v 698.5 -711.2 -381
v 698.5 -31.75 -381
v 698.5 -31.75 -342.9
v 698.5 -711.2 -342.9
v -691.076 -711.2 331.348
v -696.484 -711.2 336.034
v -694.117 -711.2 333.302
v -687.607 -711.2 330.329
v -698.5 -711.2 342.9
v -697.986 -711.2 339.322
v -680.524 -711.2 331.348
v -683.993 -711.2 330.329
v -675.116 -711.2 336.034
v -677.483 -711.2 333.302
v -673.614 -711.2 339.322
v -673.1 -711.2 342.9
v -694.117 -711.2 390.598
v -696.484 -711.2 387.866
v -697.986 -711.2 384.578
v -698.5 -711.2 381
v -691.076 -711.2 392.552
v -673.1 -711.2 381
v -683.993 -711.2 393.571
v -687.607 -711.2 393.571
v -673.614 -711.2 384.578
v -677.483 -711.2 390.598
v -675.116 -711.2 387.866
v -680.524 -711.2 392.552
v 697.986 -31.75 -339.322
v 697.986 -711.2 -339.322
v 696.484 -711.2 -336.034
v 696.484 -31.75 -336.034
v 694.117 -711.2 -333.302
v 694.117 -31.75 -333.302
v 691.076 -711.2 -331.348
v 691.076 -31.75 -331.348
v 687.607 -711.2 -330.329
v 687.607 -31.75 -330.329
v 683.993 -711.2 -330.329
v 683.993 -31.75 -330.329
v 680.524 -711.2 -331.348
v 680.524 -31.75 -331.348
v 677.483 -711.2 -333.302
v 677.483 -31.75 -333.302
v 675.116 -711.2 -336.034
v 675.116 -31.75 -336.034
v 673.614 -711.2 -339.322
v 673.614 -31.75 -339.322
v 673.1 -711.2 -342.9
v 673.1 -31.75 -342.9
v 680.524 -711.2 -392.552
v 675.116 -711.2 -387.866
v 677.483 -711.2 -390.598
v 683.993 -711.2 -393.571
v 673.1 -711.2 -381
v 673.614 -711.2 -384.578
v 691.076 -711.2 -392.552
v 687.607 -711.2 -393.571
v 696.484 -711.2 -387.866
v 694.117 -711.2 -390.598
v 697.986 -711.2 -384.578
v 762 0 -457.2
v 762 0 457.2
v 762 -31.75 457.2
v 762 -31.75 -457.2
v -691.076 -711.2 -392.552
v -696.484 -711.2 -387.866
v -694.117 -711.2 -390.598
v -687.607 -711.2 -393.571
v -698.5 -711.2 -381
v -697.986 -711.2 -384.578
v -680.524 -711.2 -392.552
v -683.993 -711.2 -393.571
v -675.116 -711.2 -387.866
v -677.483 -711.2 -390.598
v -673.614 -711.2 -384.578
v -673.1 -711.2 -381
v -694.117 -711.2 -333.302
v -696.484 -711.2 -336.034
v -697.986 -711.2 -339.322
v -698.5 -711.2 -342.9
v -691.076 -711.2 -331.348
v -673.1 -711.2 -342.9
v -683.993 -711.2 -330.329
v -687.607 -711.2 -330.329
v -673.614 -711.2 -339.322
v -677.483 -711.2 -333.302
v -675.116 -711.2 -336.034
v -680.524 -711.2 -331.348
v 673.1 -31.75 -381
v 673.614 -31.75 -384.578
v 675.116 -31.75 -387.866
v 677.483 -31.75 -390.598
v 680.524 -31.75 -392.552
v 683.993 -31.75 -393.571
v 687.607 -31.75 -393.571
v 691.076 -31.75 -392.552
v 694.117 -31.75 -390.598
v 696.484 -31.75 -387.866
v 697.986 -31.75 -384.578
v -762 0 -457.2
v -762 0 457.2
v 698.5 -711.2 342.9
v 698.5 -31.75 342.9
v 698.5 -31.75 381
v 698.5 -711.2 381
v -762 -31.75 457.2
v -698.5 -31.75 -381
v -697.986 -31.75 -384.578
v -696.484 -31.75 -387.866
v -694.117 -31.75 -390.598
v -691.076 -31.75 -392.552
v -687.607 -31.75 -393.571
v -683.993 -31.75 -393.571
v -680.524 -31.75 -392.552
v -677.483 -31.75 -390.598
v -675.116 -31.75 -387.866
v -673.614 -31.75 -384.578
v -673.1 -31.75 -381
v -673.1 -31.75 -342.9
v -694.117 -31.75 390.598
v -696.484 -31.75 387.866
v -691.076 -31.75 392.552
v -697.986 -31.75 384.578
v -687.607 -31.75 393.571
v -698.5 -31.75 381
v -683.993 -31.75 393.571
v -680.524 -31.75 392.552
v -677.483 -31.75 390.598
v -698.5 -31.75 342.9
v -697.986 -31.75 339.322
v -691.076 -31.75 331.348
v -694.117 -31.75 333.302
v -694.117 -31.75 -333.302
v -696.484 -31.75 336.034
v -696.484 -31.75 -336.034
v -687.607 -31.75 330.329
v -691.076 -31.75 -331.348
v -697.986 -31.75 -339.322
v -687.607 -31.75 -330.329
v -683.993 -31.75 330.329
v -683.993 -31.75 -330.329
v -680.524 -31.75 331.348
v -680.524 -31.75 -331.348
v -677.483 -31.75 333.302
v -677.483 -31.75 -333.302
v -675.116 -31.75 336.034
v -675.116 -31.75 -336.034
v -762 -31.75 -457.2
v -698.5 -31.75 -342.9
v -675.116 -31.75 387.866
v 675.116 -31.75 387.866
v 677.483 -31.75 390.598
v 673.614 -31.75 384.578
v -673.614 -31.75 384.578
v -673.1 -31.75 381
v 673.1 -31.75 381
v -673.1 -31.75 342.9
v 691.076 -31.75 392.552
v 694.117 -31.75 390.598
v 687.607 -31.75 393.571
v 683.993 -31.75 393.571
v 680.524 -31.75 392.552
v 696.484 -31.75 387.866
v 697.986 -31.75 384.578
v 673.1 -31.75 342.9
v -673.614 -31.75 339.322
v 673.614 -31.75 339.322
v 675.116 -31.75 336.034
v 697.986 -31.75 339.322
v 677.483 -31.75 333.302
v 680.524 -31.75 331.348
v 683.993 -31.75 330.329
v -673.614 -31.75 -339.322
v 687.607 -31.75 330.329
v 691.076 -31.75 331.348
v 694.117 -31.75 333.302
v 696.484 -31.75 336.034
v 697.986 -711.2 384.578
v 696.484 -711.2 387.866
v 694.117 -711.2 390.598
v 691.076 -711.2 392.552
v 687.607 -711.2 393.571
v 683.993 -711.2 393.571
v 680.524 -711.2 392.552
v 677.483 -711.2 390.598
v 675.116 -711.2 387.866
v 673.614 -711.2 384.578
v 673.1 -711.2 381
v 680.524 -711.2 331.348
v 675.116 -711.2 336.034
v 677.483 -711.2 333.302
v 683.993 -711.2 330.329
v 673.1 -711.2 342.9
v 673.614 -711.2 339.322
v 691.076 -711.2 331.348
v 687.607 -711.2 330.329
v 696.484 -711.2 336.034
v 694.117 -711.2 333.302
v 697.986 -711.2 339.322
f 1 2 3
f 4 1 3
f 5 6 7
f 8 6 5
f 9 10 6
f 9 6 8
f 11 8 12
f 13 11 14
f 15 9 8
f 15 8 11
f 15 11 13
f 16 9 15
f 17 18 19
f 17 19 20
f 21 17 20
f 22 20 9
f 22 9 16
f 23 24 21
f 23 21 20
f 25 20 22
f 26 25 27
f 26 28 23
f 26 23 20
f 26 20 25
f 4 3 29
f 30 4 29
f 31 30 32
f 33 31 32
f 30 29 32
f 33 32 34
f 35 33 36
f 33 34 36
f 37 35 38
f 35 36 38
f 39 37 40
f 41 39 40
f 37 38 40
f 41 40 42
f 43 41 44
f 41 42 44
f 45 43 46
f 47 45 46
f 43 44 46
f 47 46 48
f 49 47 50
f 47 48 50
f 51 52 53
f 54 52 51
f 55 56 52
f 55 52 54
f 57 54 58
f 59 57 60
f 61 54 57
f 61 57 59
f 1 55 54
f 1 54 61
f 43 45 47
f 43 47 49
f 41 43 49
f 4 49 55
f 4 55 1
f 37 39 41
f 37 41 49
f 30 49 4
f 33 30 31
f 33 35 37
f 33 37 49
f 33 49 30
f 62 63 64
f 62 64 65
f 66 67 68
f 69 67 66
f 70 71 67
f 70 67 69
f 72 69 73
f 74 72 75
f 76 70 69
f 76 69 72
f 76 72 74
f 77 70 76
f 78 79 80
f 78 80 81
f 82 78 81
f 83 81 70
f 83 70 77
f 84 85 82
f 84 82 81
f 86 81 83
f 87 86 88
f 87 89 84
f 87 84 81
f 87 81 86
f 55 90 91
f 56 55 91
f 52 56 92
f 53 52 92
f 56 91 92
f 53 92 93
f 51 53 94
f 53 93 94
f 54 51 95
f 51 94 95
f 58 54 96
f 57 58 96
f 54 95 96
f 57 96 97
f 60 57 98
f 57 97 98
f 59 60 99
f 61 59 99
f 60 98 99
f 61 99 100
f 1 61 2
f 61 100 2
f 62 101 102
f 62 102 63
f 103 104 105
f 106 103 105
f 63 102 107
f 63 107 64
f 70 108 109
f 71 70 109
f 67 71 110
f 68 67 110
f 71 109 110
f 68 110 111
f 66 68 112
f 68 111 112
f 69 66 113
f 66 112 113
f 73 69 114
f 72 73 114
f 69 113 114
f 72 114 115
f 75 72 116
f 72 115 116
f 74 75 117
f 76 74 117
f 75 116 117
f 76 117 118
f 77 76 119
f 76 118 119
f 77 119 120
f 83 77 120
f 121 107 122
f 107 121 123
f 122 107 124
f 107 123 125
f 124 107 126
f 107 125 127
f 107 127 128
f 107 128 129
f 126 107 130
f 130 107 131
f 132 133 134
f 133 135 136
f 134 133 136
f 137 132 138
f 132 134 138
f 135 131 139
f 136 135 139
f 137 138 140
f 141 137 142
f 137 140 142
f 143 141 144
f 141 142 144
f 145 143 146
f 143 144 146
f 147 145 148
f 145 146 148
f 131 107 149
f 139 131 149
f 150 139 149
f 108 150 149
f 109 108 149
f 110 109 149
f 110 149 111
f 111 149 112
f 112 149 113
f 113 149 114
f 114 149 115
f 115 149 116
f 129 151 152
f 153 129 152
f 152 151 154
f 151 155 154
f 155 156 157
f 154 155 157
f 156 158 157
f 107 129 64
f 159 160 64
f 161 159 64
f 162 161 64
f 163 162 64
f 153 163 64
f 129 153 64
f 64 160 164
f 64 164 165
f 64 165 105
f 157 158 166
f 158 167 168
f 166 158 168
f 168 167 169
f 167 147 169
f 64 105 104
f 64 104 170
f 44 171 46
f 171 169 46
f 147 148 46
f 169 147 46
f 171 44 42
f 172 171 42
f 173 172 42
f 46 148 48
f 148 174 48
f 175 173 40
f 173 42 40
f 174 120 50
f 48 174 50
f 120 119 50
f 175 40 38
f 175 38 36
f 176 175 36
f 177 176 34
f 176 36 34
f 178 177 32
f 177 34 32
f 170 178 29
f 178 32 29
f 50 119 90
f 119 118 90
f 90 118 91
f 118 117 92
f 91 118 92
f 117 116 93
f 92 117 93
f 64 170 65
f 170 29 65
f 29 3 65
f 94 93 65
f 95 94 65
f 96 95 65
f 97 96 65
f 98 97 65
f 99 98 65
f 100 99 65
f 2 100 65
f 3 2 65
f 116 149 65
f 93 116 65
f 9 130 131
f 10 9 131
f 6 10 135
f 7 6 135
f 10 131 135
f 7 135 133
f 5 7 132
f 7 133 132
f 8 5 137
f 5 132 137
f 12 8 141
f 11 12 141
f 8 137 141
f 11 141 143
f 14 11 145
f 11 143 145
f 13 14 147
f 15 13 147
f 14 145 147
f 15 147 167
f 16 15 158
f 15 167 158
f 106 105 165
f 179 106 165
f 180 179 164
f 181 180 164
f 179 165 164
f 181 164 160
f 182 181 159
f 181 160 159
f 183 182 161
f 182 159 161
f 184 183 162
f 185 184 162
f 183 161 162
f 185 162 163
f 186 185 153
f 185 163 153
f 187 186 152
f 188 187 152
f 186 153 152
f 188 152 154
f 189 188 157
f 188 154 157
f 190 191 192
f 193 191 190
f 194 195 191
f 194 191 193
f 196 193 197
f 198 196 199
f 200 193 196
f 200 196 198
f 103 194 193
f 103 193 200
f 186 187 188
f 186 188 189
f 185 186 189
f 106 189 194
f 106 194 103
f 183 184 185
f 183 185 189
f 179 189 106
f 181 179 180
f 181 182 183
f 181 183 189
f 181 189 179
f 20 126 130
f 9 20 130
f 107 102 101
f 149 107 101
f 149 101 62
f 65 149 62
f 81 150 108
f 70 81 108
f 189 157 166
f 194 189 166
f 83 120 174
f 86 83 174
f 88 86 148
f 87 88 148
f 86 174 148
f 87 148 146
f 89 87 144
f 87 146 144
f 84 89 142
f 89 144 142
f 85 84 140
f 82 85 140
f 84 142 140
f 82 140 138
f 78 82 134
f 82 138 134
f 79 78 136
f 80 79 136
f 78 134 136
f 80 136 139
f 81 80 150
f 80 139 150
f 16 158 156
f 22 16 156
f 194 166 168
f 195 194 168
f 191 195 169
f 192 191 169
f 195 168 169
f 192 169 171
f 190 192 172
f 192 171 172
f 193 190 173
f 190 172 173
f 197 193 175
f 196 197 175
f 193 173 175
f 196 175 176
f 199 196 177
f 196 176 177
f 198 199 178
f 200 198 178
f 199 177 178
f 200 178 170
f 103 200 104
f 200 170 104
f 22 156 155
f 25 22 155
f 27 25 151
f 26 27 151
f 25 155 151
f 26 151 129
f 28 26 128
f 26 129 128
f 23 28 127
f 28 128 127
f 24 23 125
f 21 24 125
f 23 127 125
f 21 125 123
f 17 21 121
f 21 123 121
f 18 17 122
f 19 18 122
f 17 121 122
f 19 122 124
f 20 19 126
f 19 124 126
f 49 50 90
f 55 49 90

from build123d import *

# Parameters (mm, degrees)
SKETCH1_W           = 1524
SKETCH1_H           = 914.4
BOSS_EXTRUDE1_DEPTH = 31.75
BOSS_EXTRUDE2_DEPTH = 679.45


with BuildPart() as part:
    # Sketch1 → Boss-Extrude1 (new body)
    with BuildSketch(Plane(origin=(0, 0, 0), x_dir=(1, 0, 0), z_dir=(0, 1, 0))):
        Rectangle(SKETCH1_W, SKETCH1_H)
    extrude(amount=-BOSS_EXTRUDE1_DEPTH)

    # Sketch2 → Boss-Extrude2 (add)
    with BuildSketch(Plane.XZ.offset(31.75)):
        with BuildLine():
            Line((-698.5, -342.9), (-698.5, -381))
            ThreePointArc((-698.5, -381), (-685.8, -393.7), (-673.1, -381))
            Line((-673.1, -381), (-673.1, -342.9))
            ThreePointArc((-673.1, -342.9), (-685.8, -330.2), (-698.5, -342.9))
        make_face()
        with BuildLine():
            Line((-698.5, 381), (-698.5, 342.9))
            ThreePointArc((-698.5, 342.9), (-685.8, 330.2), (-673.1, 342.9))
            Line((-673.1, 342.9), (-673.1, 381))
            ThreePointArc((-673.1, 381), (-685.8, 393.7), (-698.5, 381))
        make_face()
        with BuildLine():
            Line((673.1, 381), (673.1, 342.9))
            ThreePointArc((673.1, 342.9), (685.8, 330.2), (698.5, 342.9))
            Line((698.5, 342.9), (698.5, 381))
            ThreePointArc((698.5, 381), (685.8, 393.7), (673.1, 381))
        make_face()
        with BuildLine():
            Line((673.1, -342.9), (673.1, -381))
            ThreePointArc((673.1, -381), (685.8, -393.7), (698.5, -381))
            Line((698.5, -381), (698.5, -342.9))
            ThreePointArc((698.5, -342.9), (685.8, -330.2), (673.1, -342.9))
        make_face()
    extrude(amount=BOSS_EXTRUDE2_DEPTH)


solid = part.part
